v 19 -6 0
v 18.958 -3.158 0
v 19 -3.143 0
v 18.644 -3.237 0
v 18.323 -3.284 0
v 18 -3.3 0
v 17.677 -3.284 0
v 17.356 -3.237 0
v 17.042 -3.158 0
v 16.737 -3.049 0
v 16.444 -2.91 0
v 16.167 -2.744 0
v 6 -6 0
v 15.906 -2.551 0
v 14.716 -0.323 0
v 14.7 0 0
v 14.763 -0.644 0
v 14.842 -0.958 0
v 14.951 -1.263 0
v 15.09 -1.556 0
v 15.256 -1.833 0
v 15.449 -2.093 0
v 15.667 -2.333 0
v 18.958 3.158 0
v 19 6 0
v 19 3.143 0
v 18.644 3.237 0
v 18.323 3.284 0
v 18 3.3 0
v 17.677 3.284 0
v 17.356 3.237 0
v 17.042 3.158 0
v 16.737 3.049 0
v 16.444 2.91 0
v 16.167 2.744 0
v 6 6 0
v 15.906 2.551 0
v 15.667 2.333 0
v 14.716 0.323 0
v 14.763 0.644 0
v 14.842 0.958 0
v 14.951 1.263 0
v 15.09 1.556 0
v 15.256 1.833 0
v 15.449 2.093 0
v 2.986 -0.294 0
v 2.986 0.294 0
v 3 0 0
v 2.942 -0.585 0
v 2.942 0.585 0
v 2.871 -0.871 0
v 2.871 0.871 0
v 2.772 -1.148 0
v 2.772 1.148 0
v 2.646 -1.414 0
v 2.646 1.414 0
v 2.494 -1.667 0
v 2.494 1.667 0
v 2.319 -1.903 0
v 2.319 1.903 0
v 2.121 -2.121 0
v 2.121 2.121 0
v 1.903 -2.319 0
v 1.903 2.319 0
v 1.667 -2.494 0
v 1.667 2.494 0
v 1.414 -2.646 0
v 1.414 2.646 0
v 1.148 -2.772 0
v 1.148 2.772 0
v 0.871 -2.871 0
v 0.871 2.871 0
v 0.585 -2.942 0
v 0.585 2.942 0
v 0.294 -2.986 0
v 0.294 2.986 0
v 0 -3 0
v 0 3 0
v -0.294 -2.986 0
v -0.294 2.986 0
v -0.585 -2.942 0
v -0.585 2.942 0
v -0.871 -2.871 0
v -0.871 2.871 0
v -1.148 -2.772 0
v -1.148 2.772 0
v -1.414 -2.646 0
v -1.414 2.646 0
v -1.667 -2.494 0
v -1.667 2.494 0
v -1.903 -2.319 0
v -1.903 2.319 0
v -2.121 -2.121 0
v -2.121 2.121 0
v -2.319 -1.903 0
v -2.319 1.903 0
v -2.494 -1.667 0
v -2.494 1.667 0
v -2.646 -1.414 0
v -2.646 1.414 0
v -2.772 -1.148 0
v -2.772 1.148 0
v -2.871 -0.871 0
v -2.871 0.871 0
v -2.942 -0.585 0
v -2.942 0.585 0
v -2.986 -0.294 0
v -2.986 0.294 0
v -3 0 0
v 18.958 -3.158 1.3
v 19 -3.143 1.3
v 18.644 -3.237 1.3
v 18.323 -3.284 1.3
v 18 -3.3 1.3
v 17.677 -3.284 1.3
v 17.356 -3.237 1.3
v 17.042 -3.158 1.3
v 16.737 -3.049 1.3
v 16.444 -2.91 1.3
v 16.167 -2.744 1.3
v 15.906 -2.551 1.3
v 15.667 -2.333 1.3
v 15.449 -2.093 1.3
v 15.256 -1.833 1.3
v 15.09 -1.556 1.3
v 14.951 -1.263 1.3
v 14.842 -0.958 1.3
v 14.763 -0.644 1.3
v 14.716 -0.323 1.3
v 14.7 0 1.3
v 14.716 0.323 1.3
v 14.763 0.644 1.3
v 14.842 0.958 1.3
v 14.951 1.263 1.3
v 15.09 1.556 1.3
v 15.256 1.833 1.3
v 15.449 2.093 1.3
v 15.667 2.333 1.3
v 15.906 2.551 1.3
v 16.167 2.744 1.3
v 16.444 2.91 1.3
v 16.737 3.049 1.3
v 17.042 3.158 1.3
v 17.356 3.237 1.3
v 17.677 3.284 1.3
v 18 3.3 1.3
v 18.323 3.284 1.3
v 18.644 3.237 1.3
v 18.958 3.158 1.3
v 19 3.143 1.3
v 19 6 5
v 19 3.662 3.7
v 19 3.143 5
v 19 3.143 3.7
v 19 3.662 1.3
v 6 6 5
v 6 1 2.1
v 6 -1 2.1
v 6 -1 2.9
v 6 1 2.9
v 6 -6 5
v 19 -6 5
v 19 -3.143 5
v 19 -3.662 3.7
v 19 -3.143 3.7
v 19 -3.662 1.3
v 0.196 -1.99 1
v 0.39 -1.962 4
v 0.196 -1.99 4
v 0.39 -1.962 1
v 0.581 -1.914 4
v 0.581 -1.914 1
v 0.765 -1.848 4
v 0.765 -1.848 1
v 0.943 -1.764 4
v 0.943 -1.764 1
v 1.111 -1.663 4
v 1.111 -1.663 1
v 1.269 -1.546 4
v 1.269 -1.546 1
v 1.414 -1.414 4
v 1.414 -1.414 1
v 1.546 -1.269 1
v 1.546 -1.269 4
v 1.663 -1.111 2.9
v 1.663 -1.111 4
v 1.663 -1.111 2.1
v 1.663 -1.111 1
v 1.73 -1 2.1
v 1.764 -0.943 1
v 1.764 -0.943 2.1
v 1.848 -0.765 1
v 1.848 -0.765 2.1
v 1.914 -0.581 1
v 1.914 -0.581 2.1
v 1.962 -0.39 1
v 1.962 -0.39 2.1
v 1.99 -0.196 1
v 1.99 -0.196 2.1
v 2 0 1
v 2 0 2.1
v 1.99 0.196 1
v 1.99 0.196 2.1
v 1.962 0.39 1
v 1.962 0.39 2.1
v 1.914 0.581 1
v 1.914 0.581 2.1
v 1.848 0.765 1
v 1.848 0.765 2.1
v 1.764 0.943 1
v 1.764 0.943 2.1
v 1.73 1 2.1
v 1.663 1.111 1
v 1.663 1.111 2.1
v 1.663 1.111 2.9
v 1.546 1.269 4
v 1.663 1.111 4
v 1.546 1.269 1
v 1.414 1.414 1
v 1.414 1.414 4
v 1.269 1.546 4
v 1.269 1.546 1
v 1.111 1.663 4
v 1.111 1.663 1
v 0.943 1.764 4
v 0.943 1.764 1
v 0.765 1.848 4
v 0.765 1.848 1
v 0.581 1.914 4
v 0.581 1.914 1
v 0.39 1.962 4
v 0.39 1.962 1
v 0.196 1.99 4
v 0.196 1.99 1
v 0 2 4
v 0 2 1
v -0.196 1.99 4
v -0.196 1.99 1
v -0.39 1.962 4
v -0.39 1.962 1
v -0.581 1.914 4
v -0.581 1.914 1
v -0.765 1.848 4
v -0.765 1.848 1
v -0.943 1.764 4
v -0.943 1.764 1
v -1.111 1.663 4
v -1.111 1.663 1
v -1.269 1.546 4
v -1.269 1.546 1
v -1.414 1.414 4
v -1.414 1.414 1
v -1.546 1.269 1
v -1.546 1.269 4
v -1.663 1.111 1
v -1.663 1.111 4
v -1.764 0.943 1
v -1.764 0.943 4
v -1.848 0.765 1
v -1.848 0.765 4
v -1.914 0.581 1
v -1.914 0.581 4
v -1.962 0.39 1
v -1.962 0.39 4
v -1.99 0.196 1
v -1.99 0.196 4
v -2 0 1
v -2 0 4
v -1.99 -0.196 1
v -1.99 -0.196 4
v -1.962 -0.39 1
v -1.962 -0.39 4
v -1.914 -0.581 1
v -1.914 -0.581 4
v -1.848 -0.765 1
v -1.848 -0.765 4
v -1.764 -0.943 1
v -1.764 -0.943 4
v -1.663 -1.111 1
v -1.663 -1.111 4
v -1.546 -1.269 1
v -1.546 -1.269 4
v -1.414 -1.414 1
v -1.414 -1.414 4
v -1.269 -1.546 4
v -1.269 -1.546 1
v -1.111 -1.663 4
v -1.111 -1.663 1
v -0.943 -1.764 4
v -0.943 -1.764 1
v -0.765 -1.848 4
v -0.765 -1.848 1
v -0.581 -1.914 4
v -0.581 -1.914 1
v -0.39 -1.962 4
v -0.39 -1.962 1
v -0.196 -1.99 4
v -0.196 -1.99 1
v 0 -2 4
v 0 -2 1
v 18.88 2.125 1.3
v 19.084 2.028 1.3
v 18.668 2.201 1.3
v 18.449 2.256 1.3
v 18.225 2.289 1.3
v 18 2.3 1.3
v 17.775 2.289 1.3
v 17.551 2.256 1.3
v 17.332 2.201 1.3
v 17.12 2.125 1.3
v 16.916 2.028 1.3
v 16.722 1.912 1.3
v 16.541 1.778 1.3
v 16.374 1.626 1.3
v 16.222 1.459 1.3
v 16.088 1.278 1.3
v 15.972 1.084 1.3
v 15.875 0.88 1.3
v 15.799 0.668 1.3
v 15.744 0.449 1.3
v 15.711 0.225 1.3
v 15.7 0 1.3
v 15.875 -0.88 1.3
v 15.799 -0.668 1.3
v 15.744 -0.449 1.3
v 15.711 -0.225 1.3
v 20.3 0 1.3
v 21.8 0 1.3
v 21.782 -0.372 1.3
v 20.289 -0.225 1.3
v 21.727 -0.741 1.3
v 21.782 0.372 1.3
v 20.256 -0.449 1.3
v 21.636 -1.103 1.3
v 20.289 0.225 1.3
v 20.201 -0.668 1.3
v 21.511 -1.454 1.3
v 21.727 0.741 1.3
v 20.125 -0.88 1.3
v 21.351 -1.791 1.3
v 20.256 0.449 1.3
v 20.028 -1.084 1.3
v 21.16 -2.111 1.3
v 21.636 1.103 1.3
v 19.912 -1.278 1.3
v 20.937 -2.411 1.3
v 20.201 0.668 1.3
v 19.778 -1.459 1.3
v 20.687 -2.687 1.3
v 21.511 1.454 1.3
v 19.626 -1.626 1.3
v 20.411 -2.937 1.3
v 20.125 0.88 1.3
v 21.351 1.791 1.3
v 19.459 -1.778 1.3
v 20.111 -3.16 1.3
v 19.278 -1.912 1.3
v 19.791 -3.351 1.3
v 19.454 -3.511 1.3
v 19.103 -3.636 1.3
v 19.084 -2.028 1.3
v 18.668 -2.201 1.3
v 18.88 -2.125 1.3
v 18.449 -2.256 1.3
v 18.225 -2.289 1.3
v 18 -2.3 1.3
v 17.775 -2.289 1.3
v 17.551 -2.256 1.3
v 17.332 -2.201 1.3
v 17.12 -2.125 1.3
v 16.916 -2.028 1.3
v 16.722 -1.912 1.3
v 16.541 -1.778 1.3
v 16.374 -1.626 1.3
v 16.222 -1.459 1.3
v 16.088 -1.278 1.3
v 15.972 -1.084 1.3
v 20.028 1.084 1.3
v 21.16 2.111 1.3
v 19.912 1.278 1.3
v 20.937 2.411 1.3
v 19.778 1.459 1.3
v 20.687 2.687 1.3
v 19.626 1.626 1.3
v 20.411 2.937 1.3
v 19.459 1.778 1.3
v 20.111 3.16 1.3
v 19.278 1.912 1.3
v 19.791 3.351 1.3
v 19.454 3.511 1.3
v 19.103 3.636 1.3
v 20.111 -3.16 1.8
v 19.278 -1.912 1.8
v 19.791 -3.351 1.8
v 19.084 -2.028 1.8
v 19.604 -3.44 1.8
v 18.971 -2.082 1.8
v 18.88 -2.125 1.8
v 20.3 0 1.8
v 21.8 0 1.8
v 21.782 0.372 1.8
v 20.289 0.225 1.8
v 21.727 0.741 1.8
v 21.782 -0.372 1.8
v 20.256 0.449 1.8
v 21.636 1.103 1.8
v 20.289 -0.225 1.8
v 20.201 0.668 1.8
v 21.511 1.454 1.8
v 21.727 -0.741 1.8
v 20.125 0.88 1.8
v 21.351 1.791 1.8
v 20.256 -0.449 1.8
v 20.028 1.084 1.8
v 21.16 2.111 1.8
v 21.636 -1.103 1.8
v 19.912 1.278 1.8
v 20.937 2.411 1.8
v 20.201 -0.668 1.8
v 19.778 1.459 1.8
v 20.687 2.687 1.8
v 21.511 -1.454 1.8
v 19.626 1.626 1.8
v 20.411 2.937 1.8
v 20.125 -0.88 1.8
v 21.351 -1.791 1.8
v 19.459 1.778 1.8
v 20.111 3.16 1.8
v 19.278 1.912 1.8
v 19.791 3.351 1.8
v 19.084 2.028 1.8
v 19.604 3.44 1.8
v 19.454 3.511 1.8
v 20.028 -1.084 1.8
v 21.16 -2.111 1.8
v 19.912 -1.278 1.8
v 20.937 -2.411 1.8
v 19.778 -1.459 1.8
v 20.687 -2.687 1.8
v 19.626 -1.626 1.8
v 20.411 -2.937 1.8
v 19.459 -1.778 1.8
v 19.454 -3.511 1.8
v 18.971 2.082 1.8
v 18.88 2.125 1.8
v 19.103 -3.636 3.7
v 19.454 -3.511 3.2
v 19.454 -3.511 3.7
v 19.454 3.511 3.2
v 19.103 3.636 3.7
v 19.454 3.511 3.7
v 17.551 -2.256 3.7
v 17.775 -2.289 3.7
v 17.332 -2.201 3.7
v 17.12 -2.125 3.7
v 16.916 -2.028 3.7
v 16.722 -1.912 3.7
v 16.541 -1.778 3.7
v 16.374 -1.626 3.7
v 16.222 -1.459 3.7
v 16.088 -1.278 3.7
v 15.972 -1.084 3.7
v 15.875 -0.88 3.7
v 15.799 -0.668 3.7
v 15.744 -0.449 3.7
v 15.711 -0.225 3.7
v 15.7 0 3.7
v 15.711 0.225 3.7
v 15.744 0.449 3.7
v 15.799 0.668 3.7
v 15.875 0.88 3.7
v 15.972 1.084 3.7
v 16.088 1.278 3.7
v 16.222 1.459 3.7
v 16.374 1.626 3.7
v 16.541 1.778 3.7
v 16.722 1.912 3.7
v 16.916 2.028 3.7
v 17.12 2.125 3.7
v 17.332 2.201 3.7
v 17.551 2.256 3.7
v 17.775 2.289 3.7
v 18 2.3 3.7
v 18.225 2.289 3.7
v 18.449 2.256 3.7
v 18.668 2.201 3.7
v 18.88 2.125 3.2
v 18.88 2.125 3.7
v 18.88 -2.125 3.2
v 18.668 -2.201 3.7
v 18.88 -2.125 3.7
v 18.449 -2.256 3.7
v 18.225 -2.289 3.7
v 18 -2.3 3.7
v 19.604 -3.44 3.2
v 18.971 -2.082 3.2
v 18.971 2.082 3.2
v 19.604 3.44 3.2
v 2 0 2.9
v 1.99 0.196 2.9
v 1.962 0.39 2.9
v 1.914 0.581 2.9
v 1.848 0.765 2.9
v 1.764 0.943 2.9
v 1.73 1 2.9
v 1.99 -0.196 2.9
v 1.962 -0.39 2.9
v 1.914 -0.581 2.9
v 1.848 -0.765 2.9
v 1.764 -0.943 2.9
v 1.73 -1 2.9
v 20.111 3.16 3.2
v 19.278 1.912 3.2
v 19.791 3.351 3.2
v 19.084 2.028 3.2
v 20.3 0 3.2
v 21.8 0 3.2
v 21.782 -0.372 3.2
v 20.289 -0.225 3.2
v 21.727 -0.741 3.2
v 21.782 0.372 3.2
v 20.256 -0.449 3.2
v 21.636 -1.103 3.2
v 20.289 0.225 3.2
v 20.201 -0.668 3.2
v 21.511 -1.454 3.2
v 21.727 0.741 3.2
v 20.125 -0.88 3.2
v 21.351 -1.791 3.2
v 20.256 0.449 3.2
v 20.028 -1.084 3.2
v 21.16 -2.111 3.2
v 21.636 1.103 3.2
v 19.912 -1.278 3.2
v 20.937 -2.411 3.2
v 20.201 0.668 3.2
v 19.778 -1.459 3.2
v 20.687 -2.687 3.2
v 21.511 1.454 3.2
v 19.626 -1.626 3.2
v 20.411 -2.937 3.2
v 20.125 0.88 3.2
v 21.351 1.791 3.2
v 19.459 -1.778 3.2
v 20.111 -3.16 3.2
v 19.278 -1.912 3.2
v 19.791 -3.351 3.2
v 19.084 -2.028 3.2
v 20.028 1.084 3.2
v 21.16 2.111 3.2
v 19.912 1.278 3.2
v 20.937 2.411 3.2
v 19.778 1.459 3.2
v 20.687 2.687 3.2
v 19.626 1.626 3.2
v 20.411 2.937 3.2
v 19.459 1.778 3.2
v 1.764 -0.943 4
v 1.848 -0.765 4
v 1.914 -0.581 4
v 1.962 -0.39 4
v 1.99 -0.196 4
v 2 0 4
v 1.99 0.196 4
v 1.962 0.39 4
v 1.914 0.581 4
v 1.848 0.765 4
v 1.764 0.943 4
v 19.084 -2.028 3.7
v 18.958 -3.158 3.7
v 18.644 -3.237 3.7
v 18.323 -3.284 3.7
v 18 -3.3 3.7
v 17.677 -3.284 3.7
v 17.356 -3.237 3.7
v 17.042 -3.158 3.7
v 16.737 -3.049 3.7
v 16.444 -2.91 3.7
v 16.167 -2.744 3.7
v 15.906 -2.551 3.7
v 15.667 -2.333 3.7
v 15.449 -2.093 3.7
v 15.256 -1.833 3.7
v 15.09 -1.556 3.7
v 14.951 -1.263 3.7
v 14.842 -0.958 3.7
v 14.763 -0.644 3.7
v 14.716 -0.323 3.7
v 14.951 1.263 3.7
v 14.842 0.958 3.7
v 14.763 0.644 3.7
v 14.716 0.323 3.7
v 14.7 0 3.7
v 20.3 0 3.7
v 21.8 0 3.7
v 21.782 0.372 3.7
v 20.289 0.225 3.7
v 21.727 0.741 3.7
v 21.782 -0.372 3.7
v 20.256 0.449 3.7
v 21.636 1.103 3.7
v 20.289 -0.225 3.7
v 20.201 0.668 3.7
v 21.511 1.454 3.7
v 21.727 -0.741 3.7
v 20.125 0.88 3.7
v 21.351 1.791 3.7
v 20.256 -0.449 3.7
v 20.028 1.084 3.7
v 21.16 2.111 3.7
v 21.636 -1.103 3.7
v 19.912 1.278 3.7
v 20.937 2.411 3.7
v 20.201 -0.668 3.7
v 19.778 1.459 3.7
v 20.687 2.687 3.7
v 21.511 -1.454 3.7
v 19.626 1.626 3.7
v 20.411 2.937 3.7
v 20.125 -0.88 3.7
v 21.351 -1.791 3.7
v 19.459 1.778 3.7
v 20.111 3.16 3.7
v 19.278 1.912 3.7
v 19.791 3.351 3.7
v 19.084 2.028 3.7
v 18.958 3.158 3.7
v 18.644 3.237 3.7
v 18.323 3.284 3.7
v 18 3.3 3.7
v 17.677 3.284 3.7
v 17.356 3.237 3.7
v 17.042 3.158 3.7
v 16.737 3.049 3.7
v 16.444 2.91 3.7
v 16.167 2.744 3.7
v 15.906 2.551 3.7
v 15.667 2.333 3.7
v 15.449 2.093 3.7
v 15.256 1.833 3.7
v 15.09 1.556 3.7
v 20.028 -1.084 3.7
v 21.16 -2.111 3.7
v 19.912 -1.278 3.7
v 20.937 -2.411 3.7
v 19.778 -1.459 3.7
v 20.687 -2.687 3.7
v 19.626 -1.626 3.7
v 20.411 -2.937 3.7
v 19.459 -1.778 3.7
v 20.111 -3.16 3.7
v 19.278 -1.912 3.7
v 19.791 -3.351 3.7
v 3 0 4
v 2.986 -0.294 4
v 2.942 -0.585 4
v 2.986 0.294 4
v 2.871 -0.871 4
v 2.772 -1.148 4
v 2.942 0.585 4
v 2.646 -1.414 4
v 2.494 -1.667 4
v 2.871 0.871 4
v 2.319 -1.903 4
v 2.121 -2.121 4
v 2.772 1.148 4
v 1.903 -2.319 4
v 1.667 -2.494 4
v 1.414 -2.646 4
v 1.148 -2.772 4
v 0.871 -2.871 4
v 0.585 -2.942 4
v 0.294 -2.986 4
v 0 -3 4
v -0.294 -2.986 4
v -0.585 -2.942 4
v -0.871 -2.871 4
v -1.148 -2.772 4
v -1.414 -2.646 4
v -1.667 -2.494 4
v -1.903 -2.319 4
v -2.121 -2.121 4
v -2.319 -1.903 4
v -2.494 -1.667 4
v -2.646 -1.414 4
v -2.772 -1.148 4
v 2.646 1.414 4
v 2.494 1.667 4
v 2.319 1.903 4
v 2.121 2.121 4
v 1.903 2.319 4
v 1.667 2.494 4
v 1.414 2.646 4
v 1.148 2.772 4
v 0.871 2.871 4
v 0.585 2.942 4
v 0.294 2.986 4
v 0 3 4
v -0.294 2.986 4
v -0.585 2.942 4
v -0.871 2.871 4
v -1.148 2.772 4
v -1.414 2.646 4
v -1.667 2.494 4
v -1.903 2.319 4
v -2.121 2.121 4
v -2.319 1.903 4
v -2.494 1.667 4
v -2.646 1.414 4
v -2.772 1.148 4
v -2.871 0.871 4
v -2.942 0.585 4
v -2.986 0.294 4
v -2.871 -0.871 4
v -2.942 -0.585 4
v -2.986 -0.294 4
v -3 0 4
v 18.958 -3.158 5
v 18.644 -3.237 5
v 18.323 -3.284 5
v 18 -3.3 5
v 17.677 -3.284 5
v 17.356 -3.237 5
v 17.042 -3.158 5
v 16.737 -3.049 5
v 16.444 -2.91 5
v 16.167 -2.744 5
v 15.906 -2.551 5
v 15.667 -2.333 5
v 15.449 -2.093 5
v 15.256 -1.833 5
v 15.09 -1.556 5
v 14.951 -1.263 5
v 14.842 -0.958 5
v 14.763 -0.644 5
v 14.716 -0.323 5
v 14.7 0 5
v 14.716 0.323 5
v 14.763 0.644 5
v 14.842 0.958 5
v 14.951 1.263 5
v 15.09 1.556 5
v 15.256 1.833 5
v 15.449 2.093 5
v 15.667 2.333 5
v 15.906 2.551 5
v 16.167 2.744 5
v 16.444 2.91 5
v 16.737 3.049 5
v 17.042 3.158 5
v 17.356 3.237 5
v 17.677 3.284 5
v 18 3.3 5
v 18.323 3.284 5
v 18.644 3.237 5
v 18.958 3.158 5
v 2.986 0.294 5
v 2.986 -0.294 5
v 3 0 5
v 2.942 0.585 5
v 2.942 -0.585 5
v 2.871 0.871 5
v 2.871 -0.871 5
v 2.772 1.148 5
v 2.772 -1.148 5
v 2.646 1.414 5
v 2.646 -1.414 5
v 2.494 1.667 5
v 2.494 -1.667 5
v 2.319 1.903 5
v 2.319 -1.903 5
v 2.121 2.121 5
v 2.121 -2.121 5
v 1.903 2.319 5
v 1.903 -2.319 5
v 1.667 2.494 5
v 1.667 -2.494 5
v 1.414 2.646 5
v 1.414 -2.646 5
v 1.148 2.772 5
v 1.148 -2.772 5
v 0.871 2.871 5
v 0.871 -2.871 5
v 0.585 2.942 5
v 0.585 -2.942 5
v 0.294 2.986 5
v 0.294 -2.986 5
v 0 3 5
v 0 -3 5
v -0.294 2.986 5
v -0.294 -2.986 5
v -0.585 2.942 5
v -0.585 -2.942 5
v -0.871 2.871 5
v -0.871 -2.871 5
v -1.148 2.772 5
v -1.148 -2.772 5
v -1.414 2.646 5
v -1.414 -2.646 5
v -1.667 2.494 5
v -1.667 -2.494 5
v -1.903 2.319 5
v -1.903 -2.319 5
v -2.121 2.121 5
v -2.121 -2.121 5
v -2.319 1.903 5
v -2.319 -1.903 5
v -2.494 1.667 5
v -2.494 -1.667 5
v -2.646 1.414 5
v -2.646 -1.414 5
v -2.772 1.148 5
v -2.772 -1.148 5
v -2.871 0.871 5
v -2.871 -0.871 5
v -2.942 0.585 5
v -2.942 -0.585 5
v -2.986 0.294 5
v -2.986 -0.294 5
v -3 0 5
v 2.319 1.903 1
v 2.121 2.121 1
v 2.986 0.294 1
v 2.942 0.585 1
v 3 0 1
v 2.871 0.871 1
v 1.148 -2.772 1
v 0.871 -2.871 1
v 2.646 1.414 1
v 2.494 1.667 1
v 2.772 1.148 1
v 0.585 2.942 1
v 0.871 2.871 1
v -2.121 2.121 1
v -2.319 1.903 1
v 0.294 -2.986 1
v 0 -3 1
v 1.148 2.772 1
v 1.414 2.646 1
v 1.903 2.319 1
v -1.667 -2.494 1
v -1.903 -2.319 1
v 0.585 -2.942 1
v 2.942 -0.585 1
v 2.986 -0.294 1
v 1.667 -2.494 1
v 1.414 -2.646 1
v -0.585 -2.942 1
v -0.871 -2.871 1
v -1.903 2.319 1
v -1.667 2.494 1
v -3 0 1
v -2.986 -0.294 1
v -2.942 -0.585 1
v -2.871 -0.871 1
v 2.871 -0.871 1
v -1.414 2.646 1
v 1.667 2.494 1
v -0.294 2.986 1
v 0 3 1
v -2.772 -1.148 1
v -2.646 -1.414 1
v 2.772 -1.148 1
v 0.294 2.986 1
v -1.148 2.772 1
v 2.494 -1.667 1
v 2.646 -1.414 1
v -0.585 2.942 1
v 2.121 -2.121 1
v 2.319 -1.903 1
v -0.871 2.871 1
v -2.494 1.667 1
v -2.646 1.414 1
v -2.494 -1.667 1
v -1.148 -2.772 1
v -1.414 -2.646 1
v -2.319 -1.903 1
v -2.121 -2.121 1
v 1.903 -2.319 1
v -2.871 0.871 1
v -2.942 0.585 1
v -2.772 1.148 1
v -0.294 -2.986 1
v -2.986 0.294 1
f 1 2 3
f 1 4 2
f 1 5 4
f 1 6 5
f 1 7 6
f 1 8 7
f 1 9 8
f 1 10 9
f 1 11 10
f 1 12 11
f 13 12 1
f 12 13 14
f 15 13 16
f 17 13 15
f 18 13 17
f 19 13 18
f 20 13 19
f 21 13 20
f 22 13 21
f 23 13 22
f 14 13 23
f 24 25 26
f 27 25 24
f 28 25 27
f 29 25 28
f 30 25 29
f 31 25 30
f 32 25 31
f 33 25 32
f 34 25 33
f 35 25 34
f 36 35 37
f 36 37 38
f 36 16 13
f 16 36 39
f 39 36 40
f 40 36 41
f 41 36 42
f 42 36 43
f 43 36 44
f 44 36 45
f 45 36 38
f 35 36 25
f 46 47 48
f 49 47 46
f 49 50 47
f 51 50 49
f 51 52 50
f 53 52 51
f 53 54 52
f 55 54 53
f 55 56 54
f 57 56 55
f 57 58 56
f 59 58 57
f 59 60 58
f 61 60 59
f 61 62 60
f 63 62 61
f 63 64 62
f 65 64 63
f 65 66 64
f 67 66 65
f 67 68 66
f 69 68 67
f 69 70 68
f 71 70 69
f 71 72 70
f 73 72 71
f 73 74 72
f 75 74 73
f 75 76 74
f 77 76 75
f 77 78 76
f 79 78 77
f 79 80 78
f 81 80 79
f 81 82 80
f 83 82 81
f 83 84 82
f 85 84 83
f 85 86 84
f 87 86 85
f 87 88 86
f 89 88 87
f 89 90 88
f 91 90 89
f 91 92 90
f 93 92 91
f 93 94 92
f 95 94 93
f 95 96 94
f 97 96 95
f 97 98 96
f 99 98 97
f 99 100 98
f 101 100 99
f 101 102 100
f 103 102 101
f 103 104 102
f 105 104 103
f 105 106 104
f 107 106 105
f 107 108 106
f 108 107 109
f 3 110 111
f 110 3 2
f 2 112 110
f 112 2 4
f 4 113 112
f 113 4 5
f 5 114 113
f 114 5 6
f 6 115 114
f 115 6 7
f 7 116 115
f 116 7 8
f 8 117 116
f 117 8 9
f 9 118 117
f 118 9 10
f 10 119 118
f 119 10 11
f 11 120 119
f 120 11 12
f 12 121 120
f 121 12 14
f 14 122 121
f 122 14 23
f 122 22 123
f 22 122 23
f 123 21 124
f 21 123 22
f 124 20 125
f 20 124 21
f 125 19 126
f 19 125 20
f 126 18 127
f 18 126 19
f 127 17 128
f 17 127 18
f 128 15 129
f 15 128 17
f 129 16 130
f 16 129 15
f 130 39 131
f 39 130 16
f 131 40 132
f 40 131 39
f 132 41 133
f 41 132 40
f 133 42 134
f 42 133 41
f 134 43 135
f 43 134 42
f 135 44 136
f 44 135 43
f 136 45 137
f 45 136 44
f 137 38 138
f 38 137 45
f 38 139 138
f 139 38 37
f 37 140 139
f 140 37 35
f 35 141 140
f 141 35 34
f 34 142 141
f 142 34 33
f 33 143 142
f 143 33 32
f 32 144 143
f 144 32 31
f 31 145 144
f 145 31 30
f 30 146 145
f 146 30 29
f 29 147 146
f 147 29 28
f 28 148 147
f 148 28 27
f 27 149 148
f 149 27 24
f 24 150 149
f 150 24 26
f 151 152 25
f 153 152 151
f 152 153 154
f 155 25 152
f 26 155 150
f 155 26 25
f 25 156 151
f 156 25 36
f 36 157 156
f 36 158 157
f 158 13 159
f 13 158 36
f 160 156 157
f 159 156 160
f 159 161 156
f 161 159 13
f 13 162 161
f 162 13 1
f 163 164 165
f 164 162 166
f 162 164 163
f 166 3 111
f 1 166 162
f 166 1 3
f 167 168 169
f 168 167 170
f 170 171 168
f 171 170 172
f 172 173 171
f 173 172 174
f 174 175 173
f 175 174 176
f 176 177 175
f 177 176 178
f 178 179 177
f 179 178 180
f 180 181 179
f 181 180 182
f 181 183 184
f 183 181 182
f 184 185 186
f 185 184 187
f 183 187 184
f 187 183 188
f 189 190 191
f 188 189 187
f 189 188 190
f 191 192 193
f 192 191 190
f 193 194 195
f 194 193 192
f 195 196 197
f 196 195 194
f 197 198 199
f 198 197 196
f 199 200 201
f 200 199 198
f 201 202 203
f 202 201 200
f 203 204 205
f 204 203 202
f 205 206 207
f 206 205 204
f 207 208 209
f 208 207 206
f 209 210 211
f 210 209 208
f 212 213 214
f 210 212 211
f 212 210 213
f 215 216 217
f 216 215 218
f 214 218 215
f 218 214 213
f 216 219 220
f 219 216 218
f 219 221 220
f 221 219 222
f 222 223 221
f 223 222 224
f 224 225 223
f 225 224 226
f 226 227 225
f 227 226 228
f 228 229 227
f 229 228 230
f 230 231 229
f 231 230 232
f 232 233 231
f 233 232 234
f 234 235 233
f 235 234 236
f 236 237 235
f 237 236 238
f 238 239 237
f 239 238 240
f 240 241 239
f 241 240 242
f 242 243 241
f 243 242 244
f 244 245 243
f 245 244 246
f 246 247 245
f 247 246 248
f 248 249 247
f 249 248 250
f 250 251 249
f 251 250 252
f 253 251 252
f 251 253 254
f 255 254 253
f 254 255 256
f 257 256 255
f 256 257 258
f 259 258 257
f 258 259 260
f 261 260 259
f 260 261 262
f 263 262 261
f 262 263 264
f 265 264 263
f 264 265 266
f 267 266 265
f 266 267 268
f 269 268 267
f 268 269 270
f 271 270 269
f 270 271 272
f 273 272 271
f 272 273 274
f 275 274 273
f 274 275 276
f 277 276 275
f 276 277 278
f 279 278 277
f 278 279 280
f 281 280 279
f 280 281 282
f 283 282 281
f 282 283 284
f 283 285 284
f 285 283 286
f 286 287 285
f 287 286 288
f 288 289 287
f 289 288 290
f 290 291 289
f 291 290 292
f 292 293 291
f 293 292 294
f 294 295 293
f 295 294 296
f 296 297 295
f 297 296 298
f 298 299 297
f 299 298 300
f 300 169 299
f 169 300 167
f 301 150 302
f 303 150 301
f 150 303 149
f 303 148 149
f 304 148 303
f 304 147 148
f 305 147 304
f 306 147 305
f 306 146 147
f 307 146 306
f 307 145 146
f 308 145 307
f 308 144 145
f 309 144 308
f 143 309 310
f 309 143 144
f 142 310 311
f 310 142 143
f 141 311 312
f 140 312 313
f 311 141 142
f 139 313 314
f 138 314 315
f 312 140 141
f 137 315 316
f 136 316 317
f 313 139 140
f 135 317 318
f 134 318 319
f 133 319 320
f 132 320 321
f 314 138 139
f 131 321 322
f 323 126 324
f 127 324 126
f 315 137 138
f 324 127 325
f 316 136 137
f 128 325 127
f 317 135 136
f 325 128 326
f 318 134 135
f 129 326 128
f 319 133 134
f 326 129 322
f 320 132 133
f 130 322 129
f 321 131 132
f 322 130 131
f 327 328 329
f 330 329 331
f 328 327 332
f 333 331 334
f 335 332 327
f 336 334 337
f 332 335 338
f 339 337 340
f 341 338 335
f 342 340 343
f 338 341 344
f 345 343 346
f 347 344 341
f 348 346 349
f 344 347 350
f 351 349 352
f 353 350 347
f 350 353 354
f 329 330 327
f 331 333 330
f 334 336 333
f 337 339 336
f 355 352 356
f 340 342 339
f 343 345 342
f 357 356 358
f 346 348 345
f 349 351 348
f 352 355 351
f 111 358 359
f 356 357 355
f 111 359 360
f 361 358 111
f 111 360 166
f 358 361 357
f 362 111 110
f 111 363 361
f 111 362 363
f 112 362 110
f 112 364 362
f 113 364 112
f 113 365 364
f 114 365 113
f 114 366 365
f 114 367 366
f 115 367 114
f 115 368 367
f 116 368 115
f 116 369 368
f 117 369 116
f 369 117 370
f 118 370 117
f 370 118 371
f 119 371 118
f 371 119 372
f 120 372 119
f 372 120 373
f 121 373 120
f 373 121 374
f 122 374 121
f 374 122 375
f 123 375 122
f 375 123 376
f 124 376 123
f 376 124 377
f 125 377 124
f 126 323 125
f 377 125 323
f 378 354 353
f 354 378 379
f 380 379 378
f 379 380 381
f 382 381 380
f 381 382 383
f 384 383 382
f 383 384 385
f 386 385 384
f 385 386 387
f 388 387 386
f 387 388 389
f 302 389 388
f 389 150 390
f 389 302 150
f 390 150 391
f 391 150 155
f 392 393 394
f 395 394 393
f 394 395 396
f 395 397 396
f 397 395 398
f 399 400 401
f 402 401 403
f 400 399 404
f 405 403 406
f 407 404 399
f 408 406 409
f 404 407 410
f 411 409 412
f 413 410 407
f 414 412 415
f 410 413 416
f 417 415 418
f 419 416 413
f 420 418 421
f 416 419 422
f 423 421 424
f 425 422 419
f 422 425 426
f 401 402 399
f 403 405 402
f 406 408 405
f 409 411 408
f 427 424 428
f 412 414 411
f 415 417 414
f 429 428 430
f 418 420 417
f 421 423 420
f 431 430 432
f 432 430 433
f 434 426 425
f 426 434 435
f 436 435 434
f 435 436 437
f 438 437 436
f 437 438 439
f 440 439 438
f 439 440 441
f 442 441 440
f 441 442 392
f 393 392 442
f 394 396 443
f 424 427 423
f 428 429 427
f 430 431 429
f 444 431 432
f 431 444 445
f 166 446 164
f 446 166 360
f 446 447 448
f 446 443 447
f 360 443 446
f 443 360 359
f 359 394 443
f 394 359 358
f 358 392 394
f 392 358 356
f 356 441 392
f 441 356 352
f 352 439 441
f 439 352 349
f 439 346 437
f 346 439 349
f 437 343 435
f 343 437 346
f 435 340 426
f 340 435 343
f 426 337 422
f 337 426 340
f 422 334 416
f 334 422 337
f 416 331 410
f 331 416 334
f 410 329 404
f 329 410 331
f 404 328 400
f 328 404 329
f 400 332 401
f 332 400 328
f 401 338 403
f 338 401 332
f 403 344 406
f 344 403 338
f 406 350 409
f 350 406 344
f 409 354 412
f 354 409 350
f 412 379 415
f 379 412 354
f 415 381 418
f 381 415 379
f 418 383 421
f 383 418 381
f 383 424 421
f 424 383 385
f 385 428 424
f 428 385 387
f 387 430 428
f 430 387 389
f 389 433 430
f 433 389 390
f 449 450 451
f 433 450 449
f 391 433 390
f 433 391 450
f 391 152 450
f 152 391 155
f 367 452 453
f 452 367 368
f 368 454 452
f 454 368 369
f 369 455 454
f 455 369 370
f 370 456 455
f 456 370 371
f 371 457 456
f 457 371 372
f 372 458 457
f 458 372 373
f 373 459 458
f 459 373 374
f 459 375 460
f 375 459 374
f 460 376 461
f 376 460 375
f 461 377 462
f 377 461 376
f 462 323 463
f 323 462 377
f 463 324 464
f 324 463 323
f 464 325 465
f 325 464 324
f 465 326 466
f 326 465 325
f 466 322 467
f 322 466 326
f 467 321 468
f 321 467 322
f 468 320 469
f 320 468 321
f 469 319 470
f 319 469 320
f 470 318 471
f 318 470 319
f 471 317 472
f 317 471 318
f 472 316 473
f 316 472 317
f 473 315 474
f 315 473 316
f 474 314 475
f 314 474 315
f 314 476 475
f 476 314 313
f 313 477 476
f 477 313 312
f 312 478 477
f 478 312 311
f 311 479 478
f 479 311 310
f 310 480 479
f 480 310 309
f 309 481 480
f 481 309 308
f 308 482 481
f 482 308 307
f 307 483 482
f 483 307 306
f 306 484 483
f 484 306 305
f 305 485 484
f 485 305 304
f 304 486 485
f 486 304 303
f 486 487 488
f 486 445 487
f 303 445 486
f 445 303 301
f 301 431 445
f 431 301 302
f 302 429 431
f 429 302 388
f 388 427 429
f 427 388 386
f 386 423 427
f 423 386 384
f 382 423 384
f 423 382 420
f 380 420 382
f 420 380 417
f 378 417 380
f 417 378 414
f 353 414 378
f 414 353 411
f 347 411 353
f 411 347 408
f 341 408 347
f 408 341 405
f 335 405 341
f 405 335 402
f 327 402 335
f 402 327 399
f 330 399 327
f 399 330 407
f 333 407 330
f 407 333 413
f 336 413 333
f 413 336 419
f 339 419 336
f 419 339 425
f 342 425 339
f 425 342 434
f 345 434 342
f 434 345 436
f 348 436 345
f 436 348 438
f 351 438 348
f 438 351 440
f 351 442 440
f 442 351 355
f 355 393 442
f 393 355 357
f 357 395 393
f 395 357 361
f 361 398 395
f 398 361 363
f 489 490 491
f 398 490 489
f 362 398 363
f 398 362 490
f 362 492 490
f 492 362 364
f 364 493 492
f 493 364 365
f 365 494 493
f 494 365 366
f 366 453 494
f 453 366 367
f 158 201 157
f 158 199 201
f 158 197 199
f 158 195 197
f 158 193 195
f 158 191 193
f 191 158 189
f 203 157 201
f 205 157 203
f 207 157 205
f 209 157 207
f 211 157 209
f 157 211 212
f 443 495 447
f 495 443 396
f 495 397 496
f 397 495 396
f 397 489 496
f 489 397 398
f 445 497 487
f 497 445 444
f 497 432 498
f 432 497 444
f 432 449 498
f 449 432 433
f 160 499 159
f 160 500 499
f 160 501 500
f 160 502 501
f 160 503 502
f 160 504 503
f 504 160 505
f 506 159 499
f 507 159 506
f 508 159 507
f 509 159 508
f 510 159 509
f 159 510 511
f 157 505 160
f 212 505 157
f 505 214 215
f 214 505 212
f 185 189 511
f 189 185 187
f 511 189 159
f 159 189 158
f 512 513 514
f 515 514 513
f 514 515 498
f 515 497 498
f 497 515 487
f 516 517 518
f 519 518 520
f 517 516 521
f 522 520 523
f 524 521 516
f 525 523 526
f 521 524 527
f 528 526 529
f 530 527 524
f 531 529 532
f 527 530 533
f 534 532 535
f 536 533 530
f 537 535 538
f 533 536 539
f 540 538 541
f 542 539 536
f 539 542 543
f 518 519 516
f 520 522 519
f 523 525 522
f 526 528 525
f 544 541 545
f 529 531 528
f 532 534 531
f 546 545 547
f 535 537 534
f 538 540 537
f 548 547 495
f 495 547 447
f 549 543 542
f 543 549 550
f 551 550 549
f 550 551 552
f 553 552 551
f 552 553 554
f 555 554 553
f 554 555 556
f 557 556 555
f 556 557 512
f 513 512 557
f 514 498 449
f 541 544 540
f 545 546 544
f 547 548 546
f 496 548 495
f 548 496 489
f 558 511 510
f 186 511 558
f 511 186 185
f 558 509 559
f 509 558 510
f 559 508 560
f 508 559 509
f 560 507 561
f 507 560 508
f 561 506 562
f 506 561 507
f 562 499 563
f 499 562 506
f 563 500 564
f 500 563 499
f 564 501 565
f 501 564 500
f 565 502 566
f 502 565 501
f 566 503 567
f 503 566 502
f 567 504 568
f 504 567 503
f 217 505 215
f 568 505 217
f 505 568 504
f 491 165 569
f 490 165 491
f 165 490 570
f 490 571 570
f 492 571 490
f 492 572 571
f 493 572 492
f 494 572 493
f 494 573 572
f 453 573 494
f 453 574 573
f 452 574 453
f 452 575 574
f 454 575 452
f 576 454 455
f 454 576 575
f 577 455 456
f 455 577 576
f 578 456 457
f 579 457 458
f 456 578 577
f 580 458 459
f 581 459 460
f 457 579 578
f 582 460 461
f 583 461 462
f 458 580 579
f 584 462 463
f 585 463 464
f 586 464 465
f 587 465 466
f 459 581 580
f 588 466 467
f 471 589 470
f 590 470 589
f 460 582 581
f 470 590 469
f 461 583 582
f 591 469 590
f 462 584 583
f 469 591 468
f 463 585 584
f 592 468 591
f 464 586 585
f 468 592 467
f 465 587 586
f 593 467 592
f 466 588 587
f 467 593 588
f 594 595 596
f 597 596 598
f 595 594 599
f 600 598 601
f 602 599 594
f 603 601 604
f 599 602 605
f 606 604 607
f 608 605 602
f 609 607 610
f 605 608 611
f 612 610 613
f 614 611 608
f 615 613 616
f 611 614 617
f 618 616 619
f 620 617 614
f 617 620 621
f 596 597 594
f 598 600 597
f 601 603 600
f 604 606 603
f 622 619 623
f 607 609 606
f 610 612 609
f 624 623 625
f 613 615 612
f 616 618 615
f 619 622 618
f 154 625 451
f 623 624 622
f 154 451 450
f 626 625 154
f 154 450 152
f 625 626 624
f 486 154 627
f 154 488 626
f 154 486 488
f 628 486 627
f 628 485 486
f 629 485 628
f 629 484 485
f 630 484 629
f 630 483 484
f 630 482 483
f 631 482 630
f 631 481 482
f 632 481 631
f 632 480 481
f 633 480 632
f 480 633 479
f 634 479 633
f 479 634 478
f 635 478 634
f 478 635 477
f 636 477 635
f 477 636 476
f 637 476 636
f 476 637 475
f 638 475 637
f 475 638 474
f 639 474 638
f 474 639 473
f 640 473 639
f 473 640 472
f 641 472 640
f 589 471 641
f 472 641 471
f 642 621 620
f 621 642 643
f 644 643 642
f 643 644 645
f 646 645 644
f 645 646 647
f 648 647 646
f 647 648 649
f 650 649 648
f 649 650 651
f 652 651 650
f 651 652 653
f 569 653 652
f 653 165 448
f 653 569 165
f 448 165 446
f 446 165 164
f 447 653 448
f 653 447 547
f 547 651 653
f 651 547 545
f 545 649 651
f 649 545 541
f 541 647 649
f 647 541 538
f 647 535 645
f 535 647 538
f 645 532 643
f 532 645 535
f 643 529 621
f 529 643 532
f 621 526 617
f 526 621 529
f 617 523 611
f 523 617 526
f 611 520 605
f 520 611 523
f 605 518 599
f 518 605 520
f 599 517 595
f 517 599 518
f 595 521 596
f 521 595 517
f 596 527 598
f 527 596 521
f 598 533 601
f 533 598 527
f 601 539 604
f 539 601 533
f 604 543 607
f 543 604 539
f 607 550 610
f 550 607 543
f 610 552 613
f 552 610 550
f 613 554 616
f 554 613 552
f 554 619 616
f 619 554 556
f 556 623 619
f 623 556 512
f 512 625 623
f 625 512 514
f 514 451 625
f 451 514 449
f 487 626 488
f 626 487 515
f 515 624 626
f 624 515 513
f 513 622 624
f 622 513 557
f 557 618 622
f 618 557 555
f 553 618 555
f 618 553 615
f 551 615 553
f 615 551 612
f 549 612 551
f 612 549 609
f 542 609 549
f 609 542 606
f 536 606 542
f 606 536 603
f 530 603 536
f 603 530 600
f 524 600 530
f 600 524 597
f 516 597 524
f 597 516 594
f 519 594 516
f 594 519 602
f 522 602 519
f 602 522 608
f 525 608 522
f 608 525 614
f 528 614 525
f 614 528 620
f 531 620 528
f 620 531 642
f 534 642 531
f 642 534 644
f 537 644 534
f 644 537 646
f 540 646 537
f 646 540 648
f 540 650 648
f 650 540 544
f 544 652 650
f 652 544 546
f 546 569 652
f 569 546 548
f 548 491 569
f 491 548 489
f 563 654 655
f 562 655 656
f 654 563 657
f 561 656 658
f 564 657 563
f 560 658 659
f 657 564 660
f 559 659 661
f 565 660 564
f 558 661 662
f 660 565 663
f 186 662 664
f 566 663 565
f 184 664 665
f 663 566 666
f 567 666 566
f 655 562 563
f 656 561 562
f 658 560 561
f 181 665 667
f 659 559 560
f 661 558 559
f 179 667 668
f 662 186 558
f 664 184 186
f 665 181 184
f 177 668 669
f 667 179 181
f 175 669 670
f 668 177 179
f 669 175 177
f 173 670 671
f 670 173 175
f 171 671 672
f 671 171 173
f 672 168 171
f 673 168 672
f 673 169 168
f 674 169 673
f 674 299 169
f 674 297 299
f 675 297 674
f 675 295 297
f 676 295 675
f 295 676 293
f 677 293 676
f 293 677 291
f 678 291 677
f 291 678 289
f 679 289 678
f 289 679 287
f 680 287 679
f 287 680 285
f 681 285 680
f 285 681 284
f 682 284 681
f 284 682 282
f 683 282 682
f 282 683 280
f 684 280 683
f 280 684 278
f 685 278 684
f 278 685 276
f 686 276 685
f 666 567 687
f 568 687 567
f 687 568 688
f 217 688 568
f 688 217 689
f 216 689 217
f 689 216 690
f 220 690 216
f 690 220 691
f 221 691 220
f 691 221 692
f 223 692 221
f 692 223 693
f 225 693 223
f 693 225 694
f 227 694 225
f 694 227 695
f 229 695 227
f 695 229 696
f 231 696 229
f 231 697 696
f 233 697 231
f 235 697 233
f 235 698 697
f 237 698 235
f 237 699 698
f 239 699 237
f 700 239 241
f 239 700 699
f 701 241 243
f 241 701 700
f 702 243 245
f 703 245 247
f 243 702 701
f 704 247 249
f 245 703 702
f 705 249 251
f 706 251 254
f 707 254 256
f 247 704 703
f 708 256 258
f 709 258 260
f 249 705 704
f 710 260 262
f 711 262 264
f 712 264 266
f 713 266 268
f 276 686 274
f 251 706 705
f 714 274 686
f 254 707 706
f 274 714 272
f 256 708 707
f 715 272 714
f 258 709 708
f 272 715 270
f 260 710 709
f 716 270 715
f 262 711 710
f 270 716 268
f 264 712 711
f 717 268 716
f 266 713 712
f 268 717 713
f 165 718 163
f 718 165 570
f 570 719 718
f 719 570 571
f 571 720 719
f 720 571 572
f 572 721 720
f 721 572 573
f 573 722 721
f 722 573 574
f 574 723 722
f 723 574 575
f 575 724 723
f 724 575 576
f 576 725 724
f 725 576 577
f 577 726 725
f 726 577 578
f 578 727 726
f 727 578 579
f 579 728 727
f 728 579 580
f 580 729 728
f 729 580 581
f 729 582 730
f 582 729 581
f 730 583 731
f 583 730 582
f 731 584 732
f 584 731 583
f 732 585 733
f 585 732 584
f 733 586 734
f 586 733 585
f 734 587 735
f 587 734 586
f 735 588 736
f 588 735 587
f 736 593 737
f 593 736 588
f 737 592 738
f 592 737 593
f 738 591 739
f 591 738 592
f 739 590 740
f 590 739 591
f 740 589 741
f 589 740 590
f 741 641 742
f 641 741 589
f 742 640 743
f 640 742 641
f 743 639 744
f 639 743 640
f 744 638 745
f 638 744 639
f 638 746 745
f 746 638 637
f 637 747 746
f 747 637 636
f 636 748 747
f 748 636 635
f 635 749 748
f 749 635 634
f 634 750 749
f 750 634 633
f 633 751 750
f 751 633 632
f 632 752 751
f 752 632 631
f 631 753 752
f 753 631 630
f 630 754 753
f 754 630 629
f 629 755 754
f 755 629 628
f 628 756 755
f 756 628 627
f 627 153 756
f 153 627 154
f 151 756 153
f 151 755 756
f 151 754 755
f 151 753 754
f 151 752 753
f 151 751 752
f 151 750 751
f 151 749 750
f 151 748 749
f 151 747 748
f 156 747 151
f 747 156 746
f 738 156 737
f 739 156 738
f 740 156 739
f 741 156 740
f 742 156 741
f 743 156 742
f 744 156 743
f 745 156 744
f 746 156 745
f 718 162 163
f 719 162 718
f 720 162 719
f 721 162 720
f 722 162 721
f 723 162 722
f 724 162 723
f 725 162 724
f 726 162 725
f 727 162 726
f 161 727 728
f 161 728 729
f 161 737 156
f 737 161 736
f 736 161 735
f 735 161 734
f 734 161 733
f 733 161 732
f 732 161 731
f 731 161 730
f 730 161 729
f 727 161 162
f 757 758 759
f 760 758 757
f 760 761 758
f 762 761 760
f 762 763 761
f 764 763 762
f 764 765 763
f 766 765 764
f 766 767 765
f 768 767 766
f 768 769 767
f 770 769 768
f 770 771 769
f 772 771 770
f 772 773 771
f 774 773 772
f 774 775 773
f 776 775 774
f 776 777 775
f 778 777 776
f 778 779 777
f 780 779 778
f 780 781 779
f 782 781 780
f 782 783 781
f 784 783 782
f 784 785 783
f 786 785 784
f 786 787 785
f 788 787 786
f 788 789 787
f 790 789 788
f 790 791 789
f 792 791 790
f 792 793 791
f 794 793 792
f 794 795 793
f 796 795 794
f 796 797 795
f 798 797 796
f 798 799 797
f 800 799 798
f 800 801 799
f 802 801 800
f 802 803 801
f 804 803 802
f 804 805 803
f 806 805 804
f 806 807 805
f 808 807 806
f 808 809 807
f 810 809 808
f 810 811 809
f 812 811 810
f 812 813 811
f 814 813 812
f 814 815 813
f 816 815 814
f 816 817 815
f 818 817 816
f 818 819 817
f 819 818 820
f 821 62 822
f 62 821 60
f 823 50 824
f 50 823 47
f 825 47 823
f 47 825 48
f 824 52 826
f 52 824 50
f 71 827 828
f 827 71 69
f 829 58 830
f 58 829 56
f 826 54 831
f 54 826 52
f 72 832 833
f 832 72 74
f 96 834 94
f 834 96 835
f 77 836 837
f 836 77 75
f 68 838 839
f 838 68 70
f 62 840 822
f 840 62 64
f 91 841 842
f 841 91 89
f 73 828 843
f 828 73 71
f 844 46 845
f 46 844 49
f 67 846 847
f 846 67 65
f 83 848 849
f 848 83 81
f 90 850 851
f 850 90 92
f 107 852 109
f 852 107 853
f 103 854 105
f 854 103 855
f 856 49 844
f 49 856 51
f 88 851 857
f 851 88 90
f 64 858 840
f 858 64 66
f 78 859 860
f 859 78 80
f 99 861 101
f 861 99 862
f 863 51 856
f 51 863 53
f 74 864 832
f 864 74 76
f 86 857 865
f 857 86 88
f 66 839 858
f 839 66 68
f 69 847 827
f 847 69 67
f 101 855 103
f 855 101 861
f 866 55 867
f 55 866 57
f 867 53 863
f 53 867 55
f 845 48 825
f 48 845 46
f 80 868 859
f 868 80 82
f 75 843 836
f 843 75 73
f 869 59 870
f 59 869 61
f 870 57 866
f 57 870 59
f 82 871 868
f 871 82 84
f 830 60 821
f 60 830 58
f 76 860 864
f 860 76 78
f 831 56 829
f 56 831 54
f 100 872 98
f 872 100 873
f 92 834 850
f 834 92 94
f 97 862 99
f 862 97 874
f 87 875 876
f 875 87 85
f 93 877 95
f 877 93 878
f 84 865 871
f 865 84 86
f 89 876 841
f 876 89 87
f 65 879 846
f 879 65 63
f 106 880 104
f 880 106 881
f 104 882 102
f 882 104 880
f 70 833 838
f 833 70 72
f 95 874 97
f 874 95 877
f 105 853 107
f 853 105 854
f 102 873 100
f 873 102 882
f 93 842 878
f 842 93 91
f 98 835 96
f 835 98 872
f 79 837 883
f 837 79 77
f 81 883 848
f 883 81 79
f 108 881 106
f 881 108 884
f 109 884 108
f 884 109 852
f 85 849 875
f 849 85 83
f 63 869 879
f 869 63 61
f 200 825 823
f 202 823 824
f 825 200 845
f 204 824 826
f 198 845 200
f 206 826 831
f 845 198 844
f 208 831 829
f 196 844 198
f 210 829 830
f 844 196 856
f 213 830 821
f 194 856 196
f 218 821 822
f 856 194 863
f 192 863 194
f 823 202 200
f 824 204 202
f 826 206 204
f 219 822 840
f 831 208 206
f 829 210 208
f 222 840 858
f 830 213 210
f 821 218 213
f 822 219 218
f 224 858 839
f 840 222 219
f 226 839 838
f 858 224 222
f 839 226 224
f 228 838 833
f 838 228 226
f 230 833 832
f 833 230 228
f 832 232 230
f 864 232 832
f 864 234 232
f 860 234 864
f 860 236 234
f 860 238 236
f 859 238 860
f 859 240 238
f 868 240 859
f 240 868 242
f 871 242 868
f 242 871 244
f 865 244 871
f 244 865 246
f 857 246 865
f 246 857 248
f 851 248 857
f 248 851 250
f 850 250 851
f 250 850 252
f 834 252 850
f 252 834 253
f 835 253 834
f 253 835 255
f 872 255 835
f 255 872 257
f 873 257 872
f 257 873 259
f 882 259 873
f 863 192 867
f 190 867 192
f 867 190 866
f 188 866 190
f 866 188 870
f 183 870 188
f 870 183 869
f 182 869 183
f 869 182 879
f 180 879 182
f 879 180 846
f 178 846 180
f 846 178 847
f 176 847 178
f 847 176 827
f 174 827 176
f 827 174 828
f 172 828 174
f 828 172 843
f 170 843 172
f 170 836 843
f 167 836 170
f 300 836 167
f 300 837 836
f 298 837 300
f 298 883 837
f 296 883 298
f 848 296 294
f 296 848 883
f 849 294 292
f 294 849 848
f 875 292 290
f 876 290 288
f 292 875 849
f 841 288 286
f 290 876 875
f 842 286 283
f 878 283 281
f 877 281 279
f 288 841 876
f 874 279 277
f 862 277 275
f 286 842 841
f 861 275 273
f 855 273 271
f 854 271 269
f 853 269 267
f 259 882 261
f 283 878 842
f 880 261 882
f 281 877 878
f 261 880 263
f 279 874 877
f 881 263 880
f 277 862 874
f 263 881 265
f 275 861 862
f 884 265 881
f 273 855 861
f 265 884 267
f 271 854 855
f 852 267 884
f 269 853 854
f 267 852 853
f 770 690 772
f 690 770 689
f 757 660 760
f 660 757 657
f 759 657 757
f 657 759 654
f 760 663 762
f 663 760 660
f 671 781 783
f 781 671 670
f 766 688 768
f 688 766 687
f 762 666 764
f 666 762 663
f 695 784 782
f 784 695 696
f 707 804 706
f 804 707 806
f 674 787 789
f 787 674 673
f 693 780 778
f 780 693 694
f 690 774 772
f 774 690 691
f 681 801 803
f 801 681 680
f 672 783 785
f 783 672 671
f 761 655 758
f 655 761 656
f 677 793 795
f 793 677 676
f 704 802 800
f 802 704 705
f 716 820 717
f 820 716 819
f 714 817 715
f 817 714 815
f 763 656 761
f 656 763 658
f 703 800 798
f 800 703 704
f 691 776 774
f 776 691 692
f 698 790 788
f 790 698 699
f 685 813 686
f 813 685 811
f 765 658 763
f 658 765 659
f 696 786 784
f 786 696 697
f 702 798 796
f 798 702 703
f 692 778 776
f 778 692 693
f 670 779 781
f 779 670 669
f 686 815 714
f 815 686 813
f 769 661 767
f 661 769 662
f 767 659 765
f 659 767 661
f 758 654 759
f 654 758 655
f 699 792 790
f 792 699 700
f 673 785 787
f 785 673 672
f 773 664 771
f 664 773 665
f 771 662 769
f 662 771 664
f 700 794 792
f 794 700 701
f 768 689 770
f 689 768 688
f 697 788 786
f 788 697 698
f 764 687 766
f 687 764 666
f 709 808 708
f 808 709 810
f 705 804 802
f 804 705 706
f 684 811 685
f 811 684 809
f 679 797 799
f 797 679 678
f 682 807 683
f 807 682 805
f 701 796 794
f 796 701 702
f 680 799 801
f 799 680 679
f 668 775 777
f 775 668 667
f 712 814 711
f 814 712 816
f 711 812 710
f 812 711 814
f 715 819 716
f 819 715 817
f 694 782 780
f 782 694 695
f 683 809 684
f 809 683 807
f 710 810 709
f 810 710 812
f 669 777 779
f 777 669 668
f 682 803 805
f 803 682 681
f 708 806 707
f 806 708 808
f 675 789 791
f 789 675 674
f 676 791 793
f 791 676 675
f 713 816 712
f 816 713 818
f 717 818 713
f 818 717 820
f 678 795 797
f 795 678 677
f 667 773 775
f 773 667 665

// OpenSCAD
part = "link"; // [link, assembly]
cadverify_only = "";
module instance(name, part, unit = 1) {
    echo(cadverify_instance = [name, part, unit]);
    if (cadverify_only == "" || cadverify_only == name) children();
}

// Parameters (mm)
pitch = 18;          // pin-to-bore distance (10 links = 180mm)
link_w = 12;         // width (Y)
link_t = 5;          // thickness (Z)
pin_d = 4;           // pin shaft diameter
bore_d = 4.6;        // bore diameter (0.3 radial clearance)
cap_d = 6;           // cap diameter
cap_h = 1;           // cap thickness
kn_out_d = 7.6;      // knuckle outer diameter (1.5 wall)
cap_cav_d = 6.6;     // cap clearance diameter (0.3 radial)
neck_w = 2;          // neck width
neck_t = 0.8;        // neck thickness (central only)
slot_half = 65;      // slot half-angle (deg), allows +-30 deg swing
yoke_west = 6;       // yoke west edge (local X)
yoke_east = 19;      // yoke east extent (local X)
$fn = 64;

module link_geom() {
    bore_x = pitch;
    pin_r = pin_d/2;
    bore_r = bore_d/2;
    kn_out_r = kn_out_d/2;
    cav_r = cap_cav_d/2;
    cap_r = cap_d/2;
    wedge_far = 30;
    dy_far = wedge_far * tan(slot_half);
    // Z stack
    z0=0; z1=cap_h;              // 0..1 bottom
    z2=z1+0.3;                   // 1..1.3 lower cap clearance
    z3=z2+0.5;                   // 1.3..1.8 lower lip (closed)
    z4=z3+0.3;                   // 1.8..2.1 lower neck gap (slotted)
    z5=z4+neck_t;                // 2.1..2.9 central (slotted, neck lives)
    z6=z5+0.3;                   // 2.9..3.2 upper neck gap (slotted)
    z7=z6+0.5;                   // 3.2..3.7 upper lip (closed)
    z8=z7+0.3;                   // 3.7..4.0 upper cap clearance
    z9=z8+cap_h;                 // 4..5 top
    // 2D helpers (modules can't take shapes, so inline each layer)
    // bottom (0..1)
    translate([0,0,z0]) linear_extrude(height=z1-z0, convexity=8) {
        difference() {
            union() {
                circle(r=pin_r);
                translate([yoke_west,-link_w/2]) square([yoke_east-yoke_west, link_w]);
            }
            translate([bore_x,0]) circle(r=cav_r);
        }
    }
    // lower cap clearance (1..1.3)
    translate([0,0,z1]) linear_extrude(height=z2-z1, convexity=8) {
        difference() {
            union() {
                circle(r=pin_r);
                translate([yoke_west,-link_w/2]) square([yoke_east-yoke_west, link_w]);
            }
            translate([bore_x,0]) circle(r=cav_r);
        }
    }
    // lower lip (1.3..1.8) closed bore
    translate([0,0,z2]) linear_extrude(height=z3-z2, convexity=8) {
        difference() {
            union() {
                circle(r=pin_r);
                translate([yoke_west,-link_w/2]) square([yoke_east-yoke_west, link_w]);
                translate([bore_x,0]) circle(r=kn_out_r);
            }
            translate([bore_x,0]) circle(r=bore_r);
        }
    }
    // lower neck gap (1.8..2.1) slotted
    translate([0,0,z3]) linear_extrude(height=z4-z3, convexity=8) {
        difference() {
            union() {
                circle(r=pin_r);
                translate([yoke_west,-link_w/2]) square([yoke_east-yoke_west, link_w]);
                translate([bore_x,0]) circle(r=kn_out_r);
            }
            translate([bore_x,0]) circle(r=bore_r);
            polygon(points=[[bore_x,0],[bore_x+wedge_far,dy_far],[bore_x+wedge_far,-dy_far]]);
        }
    }
    // central (2.1..2.9) slotted + neck
    translate([0,0,z4]) linear_extrude(height=z5-z4, convexity=8) {
        difference() {
            union() {
                circle(r=pin_r);
                translate([0,-neck_w/2]) square([yoke_west+1, neck_w]);
                translate([yoke_west,-link_w/2]) square([yoke_east-yoke_west, link_w]);
                translate([bore_x,0]) circle(r=kn_out_r);
            }
            translate([bore_x,0]) circle(r=bore_r);
            polygon(points=[[bore_x,0],[bore_x+wedge_far,dy_far],[bore_x+wedge_far,-dy_far]]);
        }
    }
    // upper neck gap (2.9..3.2) slotted
    translate([0,0,z5]) linear_extrude(height=z6-z5, convexity=8) {
        difference() {
            union() {
                circle(r=pin_r);
                translate([yoke_west,-link_w/2]) square([yoke_east-yoke_west, link_w]);
                translate([bore_x,0]) circle(r=kn_out_r);
            }
            translate([bore_x,0]) circle(r=bore_r);
            polygon(points=[[bore_x,0],[bore_x+wedge_far,dy_far],[bore_x+wedge_far,-dy_far]]);
        }
    }
    // upper lip (3.2..3.7) closed
    translate([0,0,z6]) linear_extrude(height=z7-z6, convexity=8) {
        difference() {
            union() {
                circle(r=pin_r);
                translate([yoke_west,-link_w/2]) square([yoke_east-yoke_west, link_w]);
                translate([bore_x,0]) circle(r=kn_out_r);
            }
            translate([bore_x,0]) circle(r=bore_r);
        }
    }
    // upper cap clearance (3.7..4)
    translate([0,0,z7]) linear_extrude(height=z8-z7, convexity=8) {
        difference() {
            union() {
                circle(r=pin_r);
                translate([yoke_west,-link_w/2]) square([yoke_east-yoke_west, link_w]);
            }
            translate([bore_x,0]) circle(r=cav_r);
        }
    }
    // top (4..5)
    translate([0,0,z8]) linear_extrude(height=z9-z8, convexity=8) {
        difference() {
            union() {
                circle(r=pin_r);
                translate([yoke_west,-link_w/2]) square([yoke_east-yoke_west, link_w]);
            }
            translate([bore_x,0]) circle(r=cav_r);
        }
    }
    // caps (pin ends)
    translate([0,0,0]) cylinder(h=cap_h, r=cap_r);
    translate([0,0,link_t-cap_h]) cylinder(h=cap_h, r=cap_r);
}

if (part == "assembly") {
    instance("link1", "link", 1) translate([0,0,0]) link_geom();
    instance("link2", "link", 1) translate([18,0,0]) link_geom();
    instance("link3", "link", 1) translate([36,0,0]) link_geom();
    echo(cadverify_spec = [
        ["bounds", [[-3, -6, 0], [57.9, 6, 5]]],
        ["support_faces", [["bed", "-z", 200]]],
        ["motions", [
            ["bend", ["link3"], "rotate", [36, 0, 0], [0, 0, 1], [-30, 30]]
        ]],
        ["assembly_order", [
            [["link1", "link2", "link3"], [0, 0, 0]]
        ]],
        ["print_in_place", 0.3],
        ["overhangs_allowed", [
            ["pin cap link1", [[-3, -3, 3.8], [3, 3, 4.2]]],
            ["knuckle joint1", [[14, -4, 1.0], [22, 4, 1.6]]],
            ["pin cap link2", [[15, -3, 3.8], [21, 3, 4.2]]],
            ["knuckle joint2", [[32, -4, 1.0], [40, 4, 1.6]]],
            ["pin cap link3", [[33, -3, 3.8], [39, 3, 4.2]]],
            ["knuckle end", [[50, -4, 1.0], [58, 4, 1.6]]]
        ]],
        ["held", ["link1", "link2", "link3"]]
    ]);
} else {
    link_geom();
    echo(cadverify_spec = [
        ["bounds", [[-3, -6, 0], [21.9, 6, 5]]],
        ["bodies", 1],
        ["through_holes", 2],
        ["support_faces", [["bed", "-z", 100]]],
        ["overhangs_allowed", [
            ["pin cap", [[-3, -3, 3.8], [3, 3, 4.2]]],
            ["knuckle ceiling", [[14, -4, 1.0], [22, 4, 1.6]]]
        ]],
        ["copies", 3],
        ["details", [
            ["body", "material", [[6, -6, 0], [14, 6, 5]], 0.85],
            ["neck", "material", [[0, -1, 2.1], [7, 1, 2.9]], 0.8],
            ["knuckle", "material", [[14.2, -3.8, 1.3], [21.8, 3.8, 3.7]], 0.25],
            ["slot", "void", [[19, -1, 2.1], [21, 1, 2.9]], 0.8],
            ["cap_cavity", "void", [[14.7, -3.3, 0], [21.3, 3.3, 1]], 0.5],
            ["wall", "thickness", [18, 7, 2.5], [0, -1, 0], 3.7],
            ["floor", "thickness", [9, 0, -1], [0, 0, 1], 5]
        ]]
    ]);
}
